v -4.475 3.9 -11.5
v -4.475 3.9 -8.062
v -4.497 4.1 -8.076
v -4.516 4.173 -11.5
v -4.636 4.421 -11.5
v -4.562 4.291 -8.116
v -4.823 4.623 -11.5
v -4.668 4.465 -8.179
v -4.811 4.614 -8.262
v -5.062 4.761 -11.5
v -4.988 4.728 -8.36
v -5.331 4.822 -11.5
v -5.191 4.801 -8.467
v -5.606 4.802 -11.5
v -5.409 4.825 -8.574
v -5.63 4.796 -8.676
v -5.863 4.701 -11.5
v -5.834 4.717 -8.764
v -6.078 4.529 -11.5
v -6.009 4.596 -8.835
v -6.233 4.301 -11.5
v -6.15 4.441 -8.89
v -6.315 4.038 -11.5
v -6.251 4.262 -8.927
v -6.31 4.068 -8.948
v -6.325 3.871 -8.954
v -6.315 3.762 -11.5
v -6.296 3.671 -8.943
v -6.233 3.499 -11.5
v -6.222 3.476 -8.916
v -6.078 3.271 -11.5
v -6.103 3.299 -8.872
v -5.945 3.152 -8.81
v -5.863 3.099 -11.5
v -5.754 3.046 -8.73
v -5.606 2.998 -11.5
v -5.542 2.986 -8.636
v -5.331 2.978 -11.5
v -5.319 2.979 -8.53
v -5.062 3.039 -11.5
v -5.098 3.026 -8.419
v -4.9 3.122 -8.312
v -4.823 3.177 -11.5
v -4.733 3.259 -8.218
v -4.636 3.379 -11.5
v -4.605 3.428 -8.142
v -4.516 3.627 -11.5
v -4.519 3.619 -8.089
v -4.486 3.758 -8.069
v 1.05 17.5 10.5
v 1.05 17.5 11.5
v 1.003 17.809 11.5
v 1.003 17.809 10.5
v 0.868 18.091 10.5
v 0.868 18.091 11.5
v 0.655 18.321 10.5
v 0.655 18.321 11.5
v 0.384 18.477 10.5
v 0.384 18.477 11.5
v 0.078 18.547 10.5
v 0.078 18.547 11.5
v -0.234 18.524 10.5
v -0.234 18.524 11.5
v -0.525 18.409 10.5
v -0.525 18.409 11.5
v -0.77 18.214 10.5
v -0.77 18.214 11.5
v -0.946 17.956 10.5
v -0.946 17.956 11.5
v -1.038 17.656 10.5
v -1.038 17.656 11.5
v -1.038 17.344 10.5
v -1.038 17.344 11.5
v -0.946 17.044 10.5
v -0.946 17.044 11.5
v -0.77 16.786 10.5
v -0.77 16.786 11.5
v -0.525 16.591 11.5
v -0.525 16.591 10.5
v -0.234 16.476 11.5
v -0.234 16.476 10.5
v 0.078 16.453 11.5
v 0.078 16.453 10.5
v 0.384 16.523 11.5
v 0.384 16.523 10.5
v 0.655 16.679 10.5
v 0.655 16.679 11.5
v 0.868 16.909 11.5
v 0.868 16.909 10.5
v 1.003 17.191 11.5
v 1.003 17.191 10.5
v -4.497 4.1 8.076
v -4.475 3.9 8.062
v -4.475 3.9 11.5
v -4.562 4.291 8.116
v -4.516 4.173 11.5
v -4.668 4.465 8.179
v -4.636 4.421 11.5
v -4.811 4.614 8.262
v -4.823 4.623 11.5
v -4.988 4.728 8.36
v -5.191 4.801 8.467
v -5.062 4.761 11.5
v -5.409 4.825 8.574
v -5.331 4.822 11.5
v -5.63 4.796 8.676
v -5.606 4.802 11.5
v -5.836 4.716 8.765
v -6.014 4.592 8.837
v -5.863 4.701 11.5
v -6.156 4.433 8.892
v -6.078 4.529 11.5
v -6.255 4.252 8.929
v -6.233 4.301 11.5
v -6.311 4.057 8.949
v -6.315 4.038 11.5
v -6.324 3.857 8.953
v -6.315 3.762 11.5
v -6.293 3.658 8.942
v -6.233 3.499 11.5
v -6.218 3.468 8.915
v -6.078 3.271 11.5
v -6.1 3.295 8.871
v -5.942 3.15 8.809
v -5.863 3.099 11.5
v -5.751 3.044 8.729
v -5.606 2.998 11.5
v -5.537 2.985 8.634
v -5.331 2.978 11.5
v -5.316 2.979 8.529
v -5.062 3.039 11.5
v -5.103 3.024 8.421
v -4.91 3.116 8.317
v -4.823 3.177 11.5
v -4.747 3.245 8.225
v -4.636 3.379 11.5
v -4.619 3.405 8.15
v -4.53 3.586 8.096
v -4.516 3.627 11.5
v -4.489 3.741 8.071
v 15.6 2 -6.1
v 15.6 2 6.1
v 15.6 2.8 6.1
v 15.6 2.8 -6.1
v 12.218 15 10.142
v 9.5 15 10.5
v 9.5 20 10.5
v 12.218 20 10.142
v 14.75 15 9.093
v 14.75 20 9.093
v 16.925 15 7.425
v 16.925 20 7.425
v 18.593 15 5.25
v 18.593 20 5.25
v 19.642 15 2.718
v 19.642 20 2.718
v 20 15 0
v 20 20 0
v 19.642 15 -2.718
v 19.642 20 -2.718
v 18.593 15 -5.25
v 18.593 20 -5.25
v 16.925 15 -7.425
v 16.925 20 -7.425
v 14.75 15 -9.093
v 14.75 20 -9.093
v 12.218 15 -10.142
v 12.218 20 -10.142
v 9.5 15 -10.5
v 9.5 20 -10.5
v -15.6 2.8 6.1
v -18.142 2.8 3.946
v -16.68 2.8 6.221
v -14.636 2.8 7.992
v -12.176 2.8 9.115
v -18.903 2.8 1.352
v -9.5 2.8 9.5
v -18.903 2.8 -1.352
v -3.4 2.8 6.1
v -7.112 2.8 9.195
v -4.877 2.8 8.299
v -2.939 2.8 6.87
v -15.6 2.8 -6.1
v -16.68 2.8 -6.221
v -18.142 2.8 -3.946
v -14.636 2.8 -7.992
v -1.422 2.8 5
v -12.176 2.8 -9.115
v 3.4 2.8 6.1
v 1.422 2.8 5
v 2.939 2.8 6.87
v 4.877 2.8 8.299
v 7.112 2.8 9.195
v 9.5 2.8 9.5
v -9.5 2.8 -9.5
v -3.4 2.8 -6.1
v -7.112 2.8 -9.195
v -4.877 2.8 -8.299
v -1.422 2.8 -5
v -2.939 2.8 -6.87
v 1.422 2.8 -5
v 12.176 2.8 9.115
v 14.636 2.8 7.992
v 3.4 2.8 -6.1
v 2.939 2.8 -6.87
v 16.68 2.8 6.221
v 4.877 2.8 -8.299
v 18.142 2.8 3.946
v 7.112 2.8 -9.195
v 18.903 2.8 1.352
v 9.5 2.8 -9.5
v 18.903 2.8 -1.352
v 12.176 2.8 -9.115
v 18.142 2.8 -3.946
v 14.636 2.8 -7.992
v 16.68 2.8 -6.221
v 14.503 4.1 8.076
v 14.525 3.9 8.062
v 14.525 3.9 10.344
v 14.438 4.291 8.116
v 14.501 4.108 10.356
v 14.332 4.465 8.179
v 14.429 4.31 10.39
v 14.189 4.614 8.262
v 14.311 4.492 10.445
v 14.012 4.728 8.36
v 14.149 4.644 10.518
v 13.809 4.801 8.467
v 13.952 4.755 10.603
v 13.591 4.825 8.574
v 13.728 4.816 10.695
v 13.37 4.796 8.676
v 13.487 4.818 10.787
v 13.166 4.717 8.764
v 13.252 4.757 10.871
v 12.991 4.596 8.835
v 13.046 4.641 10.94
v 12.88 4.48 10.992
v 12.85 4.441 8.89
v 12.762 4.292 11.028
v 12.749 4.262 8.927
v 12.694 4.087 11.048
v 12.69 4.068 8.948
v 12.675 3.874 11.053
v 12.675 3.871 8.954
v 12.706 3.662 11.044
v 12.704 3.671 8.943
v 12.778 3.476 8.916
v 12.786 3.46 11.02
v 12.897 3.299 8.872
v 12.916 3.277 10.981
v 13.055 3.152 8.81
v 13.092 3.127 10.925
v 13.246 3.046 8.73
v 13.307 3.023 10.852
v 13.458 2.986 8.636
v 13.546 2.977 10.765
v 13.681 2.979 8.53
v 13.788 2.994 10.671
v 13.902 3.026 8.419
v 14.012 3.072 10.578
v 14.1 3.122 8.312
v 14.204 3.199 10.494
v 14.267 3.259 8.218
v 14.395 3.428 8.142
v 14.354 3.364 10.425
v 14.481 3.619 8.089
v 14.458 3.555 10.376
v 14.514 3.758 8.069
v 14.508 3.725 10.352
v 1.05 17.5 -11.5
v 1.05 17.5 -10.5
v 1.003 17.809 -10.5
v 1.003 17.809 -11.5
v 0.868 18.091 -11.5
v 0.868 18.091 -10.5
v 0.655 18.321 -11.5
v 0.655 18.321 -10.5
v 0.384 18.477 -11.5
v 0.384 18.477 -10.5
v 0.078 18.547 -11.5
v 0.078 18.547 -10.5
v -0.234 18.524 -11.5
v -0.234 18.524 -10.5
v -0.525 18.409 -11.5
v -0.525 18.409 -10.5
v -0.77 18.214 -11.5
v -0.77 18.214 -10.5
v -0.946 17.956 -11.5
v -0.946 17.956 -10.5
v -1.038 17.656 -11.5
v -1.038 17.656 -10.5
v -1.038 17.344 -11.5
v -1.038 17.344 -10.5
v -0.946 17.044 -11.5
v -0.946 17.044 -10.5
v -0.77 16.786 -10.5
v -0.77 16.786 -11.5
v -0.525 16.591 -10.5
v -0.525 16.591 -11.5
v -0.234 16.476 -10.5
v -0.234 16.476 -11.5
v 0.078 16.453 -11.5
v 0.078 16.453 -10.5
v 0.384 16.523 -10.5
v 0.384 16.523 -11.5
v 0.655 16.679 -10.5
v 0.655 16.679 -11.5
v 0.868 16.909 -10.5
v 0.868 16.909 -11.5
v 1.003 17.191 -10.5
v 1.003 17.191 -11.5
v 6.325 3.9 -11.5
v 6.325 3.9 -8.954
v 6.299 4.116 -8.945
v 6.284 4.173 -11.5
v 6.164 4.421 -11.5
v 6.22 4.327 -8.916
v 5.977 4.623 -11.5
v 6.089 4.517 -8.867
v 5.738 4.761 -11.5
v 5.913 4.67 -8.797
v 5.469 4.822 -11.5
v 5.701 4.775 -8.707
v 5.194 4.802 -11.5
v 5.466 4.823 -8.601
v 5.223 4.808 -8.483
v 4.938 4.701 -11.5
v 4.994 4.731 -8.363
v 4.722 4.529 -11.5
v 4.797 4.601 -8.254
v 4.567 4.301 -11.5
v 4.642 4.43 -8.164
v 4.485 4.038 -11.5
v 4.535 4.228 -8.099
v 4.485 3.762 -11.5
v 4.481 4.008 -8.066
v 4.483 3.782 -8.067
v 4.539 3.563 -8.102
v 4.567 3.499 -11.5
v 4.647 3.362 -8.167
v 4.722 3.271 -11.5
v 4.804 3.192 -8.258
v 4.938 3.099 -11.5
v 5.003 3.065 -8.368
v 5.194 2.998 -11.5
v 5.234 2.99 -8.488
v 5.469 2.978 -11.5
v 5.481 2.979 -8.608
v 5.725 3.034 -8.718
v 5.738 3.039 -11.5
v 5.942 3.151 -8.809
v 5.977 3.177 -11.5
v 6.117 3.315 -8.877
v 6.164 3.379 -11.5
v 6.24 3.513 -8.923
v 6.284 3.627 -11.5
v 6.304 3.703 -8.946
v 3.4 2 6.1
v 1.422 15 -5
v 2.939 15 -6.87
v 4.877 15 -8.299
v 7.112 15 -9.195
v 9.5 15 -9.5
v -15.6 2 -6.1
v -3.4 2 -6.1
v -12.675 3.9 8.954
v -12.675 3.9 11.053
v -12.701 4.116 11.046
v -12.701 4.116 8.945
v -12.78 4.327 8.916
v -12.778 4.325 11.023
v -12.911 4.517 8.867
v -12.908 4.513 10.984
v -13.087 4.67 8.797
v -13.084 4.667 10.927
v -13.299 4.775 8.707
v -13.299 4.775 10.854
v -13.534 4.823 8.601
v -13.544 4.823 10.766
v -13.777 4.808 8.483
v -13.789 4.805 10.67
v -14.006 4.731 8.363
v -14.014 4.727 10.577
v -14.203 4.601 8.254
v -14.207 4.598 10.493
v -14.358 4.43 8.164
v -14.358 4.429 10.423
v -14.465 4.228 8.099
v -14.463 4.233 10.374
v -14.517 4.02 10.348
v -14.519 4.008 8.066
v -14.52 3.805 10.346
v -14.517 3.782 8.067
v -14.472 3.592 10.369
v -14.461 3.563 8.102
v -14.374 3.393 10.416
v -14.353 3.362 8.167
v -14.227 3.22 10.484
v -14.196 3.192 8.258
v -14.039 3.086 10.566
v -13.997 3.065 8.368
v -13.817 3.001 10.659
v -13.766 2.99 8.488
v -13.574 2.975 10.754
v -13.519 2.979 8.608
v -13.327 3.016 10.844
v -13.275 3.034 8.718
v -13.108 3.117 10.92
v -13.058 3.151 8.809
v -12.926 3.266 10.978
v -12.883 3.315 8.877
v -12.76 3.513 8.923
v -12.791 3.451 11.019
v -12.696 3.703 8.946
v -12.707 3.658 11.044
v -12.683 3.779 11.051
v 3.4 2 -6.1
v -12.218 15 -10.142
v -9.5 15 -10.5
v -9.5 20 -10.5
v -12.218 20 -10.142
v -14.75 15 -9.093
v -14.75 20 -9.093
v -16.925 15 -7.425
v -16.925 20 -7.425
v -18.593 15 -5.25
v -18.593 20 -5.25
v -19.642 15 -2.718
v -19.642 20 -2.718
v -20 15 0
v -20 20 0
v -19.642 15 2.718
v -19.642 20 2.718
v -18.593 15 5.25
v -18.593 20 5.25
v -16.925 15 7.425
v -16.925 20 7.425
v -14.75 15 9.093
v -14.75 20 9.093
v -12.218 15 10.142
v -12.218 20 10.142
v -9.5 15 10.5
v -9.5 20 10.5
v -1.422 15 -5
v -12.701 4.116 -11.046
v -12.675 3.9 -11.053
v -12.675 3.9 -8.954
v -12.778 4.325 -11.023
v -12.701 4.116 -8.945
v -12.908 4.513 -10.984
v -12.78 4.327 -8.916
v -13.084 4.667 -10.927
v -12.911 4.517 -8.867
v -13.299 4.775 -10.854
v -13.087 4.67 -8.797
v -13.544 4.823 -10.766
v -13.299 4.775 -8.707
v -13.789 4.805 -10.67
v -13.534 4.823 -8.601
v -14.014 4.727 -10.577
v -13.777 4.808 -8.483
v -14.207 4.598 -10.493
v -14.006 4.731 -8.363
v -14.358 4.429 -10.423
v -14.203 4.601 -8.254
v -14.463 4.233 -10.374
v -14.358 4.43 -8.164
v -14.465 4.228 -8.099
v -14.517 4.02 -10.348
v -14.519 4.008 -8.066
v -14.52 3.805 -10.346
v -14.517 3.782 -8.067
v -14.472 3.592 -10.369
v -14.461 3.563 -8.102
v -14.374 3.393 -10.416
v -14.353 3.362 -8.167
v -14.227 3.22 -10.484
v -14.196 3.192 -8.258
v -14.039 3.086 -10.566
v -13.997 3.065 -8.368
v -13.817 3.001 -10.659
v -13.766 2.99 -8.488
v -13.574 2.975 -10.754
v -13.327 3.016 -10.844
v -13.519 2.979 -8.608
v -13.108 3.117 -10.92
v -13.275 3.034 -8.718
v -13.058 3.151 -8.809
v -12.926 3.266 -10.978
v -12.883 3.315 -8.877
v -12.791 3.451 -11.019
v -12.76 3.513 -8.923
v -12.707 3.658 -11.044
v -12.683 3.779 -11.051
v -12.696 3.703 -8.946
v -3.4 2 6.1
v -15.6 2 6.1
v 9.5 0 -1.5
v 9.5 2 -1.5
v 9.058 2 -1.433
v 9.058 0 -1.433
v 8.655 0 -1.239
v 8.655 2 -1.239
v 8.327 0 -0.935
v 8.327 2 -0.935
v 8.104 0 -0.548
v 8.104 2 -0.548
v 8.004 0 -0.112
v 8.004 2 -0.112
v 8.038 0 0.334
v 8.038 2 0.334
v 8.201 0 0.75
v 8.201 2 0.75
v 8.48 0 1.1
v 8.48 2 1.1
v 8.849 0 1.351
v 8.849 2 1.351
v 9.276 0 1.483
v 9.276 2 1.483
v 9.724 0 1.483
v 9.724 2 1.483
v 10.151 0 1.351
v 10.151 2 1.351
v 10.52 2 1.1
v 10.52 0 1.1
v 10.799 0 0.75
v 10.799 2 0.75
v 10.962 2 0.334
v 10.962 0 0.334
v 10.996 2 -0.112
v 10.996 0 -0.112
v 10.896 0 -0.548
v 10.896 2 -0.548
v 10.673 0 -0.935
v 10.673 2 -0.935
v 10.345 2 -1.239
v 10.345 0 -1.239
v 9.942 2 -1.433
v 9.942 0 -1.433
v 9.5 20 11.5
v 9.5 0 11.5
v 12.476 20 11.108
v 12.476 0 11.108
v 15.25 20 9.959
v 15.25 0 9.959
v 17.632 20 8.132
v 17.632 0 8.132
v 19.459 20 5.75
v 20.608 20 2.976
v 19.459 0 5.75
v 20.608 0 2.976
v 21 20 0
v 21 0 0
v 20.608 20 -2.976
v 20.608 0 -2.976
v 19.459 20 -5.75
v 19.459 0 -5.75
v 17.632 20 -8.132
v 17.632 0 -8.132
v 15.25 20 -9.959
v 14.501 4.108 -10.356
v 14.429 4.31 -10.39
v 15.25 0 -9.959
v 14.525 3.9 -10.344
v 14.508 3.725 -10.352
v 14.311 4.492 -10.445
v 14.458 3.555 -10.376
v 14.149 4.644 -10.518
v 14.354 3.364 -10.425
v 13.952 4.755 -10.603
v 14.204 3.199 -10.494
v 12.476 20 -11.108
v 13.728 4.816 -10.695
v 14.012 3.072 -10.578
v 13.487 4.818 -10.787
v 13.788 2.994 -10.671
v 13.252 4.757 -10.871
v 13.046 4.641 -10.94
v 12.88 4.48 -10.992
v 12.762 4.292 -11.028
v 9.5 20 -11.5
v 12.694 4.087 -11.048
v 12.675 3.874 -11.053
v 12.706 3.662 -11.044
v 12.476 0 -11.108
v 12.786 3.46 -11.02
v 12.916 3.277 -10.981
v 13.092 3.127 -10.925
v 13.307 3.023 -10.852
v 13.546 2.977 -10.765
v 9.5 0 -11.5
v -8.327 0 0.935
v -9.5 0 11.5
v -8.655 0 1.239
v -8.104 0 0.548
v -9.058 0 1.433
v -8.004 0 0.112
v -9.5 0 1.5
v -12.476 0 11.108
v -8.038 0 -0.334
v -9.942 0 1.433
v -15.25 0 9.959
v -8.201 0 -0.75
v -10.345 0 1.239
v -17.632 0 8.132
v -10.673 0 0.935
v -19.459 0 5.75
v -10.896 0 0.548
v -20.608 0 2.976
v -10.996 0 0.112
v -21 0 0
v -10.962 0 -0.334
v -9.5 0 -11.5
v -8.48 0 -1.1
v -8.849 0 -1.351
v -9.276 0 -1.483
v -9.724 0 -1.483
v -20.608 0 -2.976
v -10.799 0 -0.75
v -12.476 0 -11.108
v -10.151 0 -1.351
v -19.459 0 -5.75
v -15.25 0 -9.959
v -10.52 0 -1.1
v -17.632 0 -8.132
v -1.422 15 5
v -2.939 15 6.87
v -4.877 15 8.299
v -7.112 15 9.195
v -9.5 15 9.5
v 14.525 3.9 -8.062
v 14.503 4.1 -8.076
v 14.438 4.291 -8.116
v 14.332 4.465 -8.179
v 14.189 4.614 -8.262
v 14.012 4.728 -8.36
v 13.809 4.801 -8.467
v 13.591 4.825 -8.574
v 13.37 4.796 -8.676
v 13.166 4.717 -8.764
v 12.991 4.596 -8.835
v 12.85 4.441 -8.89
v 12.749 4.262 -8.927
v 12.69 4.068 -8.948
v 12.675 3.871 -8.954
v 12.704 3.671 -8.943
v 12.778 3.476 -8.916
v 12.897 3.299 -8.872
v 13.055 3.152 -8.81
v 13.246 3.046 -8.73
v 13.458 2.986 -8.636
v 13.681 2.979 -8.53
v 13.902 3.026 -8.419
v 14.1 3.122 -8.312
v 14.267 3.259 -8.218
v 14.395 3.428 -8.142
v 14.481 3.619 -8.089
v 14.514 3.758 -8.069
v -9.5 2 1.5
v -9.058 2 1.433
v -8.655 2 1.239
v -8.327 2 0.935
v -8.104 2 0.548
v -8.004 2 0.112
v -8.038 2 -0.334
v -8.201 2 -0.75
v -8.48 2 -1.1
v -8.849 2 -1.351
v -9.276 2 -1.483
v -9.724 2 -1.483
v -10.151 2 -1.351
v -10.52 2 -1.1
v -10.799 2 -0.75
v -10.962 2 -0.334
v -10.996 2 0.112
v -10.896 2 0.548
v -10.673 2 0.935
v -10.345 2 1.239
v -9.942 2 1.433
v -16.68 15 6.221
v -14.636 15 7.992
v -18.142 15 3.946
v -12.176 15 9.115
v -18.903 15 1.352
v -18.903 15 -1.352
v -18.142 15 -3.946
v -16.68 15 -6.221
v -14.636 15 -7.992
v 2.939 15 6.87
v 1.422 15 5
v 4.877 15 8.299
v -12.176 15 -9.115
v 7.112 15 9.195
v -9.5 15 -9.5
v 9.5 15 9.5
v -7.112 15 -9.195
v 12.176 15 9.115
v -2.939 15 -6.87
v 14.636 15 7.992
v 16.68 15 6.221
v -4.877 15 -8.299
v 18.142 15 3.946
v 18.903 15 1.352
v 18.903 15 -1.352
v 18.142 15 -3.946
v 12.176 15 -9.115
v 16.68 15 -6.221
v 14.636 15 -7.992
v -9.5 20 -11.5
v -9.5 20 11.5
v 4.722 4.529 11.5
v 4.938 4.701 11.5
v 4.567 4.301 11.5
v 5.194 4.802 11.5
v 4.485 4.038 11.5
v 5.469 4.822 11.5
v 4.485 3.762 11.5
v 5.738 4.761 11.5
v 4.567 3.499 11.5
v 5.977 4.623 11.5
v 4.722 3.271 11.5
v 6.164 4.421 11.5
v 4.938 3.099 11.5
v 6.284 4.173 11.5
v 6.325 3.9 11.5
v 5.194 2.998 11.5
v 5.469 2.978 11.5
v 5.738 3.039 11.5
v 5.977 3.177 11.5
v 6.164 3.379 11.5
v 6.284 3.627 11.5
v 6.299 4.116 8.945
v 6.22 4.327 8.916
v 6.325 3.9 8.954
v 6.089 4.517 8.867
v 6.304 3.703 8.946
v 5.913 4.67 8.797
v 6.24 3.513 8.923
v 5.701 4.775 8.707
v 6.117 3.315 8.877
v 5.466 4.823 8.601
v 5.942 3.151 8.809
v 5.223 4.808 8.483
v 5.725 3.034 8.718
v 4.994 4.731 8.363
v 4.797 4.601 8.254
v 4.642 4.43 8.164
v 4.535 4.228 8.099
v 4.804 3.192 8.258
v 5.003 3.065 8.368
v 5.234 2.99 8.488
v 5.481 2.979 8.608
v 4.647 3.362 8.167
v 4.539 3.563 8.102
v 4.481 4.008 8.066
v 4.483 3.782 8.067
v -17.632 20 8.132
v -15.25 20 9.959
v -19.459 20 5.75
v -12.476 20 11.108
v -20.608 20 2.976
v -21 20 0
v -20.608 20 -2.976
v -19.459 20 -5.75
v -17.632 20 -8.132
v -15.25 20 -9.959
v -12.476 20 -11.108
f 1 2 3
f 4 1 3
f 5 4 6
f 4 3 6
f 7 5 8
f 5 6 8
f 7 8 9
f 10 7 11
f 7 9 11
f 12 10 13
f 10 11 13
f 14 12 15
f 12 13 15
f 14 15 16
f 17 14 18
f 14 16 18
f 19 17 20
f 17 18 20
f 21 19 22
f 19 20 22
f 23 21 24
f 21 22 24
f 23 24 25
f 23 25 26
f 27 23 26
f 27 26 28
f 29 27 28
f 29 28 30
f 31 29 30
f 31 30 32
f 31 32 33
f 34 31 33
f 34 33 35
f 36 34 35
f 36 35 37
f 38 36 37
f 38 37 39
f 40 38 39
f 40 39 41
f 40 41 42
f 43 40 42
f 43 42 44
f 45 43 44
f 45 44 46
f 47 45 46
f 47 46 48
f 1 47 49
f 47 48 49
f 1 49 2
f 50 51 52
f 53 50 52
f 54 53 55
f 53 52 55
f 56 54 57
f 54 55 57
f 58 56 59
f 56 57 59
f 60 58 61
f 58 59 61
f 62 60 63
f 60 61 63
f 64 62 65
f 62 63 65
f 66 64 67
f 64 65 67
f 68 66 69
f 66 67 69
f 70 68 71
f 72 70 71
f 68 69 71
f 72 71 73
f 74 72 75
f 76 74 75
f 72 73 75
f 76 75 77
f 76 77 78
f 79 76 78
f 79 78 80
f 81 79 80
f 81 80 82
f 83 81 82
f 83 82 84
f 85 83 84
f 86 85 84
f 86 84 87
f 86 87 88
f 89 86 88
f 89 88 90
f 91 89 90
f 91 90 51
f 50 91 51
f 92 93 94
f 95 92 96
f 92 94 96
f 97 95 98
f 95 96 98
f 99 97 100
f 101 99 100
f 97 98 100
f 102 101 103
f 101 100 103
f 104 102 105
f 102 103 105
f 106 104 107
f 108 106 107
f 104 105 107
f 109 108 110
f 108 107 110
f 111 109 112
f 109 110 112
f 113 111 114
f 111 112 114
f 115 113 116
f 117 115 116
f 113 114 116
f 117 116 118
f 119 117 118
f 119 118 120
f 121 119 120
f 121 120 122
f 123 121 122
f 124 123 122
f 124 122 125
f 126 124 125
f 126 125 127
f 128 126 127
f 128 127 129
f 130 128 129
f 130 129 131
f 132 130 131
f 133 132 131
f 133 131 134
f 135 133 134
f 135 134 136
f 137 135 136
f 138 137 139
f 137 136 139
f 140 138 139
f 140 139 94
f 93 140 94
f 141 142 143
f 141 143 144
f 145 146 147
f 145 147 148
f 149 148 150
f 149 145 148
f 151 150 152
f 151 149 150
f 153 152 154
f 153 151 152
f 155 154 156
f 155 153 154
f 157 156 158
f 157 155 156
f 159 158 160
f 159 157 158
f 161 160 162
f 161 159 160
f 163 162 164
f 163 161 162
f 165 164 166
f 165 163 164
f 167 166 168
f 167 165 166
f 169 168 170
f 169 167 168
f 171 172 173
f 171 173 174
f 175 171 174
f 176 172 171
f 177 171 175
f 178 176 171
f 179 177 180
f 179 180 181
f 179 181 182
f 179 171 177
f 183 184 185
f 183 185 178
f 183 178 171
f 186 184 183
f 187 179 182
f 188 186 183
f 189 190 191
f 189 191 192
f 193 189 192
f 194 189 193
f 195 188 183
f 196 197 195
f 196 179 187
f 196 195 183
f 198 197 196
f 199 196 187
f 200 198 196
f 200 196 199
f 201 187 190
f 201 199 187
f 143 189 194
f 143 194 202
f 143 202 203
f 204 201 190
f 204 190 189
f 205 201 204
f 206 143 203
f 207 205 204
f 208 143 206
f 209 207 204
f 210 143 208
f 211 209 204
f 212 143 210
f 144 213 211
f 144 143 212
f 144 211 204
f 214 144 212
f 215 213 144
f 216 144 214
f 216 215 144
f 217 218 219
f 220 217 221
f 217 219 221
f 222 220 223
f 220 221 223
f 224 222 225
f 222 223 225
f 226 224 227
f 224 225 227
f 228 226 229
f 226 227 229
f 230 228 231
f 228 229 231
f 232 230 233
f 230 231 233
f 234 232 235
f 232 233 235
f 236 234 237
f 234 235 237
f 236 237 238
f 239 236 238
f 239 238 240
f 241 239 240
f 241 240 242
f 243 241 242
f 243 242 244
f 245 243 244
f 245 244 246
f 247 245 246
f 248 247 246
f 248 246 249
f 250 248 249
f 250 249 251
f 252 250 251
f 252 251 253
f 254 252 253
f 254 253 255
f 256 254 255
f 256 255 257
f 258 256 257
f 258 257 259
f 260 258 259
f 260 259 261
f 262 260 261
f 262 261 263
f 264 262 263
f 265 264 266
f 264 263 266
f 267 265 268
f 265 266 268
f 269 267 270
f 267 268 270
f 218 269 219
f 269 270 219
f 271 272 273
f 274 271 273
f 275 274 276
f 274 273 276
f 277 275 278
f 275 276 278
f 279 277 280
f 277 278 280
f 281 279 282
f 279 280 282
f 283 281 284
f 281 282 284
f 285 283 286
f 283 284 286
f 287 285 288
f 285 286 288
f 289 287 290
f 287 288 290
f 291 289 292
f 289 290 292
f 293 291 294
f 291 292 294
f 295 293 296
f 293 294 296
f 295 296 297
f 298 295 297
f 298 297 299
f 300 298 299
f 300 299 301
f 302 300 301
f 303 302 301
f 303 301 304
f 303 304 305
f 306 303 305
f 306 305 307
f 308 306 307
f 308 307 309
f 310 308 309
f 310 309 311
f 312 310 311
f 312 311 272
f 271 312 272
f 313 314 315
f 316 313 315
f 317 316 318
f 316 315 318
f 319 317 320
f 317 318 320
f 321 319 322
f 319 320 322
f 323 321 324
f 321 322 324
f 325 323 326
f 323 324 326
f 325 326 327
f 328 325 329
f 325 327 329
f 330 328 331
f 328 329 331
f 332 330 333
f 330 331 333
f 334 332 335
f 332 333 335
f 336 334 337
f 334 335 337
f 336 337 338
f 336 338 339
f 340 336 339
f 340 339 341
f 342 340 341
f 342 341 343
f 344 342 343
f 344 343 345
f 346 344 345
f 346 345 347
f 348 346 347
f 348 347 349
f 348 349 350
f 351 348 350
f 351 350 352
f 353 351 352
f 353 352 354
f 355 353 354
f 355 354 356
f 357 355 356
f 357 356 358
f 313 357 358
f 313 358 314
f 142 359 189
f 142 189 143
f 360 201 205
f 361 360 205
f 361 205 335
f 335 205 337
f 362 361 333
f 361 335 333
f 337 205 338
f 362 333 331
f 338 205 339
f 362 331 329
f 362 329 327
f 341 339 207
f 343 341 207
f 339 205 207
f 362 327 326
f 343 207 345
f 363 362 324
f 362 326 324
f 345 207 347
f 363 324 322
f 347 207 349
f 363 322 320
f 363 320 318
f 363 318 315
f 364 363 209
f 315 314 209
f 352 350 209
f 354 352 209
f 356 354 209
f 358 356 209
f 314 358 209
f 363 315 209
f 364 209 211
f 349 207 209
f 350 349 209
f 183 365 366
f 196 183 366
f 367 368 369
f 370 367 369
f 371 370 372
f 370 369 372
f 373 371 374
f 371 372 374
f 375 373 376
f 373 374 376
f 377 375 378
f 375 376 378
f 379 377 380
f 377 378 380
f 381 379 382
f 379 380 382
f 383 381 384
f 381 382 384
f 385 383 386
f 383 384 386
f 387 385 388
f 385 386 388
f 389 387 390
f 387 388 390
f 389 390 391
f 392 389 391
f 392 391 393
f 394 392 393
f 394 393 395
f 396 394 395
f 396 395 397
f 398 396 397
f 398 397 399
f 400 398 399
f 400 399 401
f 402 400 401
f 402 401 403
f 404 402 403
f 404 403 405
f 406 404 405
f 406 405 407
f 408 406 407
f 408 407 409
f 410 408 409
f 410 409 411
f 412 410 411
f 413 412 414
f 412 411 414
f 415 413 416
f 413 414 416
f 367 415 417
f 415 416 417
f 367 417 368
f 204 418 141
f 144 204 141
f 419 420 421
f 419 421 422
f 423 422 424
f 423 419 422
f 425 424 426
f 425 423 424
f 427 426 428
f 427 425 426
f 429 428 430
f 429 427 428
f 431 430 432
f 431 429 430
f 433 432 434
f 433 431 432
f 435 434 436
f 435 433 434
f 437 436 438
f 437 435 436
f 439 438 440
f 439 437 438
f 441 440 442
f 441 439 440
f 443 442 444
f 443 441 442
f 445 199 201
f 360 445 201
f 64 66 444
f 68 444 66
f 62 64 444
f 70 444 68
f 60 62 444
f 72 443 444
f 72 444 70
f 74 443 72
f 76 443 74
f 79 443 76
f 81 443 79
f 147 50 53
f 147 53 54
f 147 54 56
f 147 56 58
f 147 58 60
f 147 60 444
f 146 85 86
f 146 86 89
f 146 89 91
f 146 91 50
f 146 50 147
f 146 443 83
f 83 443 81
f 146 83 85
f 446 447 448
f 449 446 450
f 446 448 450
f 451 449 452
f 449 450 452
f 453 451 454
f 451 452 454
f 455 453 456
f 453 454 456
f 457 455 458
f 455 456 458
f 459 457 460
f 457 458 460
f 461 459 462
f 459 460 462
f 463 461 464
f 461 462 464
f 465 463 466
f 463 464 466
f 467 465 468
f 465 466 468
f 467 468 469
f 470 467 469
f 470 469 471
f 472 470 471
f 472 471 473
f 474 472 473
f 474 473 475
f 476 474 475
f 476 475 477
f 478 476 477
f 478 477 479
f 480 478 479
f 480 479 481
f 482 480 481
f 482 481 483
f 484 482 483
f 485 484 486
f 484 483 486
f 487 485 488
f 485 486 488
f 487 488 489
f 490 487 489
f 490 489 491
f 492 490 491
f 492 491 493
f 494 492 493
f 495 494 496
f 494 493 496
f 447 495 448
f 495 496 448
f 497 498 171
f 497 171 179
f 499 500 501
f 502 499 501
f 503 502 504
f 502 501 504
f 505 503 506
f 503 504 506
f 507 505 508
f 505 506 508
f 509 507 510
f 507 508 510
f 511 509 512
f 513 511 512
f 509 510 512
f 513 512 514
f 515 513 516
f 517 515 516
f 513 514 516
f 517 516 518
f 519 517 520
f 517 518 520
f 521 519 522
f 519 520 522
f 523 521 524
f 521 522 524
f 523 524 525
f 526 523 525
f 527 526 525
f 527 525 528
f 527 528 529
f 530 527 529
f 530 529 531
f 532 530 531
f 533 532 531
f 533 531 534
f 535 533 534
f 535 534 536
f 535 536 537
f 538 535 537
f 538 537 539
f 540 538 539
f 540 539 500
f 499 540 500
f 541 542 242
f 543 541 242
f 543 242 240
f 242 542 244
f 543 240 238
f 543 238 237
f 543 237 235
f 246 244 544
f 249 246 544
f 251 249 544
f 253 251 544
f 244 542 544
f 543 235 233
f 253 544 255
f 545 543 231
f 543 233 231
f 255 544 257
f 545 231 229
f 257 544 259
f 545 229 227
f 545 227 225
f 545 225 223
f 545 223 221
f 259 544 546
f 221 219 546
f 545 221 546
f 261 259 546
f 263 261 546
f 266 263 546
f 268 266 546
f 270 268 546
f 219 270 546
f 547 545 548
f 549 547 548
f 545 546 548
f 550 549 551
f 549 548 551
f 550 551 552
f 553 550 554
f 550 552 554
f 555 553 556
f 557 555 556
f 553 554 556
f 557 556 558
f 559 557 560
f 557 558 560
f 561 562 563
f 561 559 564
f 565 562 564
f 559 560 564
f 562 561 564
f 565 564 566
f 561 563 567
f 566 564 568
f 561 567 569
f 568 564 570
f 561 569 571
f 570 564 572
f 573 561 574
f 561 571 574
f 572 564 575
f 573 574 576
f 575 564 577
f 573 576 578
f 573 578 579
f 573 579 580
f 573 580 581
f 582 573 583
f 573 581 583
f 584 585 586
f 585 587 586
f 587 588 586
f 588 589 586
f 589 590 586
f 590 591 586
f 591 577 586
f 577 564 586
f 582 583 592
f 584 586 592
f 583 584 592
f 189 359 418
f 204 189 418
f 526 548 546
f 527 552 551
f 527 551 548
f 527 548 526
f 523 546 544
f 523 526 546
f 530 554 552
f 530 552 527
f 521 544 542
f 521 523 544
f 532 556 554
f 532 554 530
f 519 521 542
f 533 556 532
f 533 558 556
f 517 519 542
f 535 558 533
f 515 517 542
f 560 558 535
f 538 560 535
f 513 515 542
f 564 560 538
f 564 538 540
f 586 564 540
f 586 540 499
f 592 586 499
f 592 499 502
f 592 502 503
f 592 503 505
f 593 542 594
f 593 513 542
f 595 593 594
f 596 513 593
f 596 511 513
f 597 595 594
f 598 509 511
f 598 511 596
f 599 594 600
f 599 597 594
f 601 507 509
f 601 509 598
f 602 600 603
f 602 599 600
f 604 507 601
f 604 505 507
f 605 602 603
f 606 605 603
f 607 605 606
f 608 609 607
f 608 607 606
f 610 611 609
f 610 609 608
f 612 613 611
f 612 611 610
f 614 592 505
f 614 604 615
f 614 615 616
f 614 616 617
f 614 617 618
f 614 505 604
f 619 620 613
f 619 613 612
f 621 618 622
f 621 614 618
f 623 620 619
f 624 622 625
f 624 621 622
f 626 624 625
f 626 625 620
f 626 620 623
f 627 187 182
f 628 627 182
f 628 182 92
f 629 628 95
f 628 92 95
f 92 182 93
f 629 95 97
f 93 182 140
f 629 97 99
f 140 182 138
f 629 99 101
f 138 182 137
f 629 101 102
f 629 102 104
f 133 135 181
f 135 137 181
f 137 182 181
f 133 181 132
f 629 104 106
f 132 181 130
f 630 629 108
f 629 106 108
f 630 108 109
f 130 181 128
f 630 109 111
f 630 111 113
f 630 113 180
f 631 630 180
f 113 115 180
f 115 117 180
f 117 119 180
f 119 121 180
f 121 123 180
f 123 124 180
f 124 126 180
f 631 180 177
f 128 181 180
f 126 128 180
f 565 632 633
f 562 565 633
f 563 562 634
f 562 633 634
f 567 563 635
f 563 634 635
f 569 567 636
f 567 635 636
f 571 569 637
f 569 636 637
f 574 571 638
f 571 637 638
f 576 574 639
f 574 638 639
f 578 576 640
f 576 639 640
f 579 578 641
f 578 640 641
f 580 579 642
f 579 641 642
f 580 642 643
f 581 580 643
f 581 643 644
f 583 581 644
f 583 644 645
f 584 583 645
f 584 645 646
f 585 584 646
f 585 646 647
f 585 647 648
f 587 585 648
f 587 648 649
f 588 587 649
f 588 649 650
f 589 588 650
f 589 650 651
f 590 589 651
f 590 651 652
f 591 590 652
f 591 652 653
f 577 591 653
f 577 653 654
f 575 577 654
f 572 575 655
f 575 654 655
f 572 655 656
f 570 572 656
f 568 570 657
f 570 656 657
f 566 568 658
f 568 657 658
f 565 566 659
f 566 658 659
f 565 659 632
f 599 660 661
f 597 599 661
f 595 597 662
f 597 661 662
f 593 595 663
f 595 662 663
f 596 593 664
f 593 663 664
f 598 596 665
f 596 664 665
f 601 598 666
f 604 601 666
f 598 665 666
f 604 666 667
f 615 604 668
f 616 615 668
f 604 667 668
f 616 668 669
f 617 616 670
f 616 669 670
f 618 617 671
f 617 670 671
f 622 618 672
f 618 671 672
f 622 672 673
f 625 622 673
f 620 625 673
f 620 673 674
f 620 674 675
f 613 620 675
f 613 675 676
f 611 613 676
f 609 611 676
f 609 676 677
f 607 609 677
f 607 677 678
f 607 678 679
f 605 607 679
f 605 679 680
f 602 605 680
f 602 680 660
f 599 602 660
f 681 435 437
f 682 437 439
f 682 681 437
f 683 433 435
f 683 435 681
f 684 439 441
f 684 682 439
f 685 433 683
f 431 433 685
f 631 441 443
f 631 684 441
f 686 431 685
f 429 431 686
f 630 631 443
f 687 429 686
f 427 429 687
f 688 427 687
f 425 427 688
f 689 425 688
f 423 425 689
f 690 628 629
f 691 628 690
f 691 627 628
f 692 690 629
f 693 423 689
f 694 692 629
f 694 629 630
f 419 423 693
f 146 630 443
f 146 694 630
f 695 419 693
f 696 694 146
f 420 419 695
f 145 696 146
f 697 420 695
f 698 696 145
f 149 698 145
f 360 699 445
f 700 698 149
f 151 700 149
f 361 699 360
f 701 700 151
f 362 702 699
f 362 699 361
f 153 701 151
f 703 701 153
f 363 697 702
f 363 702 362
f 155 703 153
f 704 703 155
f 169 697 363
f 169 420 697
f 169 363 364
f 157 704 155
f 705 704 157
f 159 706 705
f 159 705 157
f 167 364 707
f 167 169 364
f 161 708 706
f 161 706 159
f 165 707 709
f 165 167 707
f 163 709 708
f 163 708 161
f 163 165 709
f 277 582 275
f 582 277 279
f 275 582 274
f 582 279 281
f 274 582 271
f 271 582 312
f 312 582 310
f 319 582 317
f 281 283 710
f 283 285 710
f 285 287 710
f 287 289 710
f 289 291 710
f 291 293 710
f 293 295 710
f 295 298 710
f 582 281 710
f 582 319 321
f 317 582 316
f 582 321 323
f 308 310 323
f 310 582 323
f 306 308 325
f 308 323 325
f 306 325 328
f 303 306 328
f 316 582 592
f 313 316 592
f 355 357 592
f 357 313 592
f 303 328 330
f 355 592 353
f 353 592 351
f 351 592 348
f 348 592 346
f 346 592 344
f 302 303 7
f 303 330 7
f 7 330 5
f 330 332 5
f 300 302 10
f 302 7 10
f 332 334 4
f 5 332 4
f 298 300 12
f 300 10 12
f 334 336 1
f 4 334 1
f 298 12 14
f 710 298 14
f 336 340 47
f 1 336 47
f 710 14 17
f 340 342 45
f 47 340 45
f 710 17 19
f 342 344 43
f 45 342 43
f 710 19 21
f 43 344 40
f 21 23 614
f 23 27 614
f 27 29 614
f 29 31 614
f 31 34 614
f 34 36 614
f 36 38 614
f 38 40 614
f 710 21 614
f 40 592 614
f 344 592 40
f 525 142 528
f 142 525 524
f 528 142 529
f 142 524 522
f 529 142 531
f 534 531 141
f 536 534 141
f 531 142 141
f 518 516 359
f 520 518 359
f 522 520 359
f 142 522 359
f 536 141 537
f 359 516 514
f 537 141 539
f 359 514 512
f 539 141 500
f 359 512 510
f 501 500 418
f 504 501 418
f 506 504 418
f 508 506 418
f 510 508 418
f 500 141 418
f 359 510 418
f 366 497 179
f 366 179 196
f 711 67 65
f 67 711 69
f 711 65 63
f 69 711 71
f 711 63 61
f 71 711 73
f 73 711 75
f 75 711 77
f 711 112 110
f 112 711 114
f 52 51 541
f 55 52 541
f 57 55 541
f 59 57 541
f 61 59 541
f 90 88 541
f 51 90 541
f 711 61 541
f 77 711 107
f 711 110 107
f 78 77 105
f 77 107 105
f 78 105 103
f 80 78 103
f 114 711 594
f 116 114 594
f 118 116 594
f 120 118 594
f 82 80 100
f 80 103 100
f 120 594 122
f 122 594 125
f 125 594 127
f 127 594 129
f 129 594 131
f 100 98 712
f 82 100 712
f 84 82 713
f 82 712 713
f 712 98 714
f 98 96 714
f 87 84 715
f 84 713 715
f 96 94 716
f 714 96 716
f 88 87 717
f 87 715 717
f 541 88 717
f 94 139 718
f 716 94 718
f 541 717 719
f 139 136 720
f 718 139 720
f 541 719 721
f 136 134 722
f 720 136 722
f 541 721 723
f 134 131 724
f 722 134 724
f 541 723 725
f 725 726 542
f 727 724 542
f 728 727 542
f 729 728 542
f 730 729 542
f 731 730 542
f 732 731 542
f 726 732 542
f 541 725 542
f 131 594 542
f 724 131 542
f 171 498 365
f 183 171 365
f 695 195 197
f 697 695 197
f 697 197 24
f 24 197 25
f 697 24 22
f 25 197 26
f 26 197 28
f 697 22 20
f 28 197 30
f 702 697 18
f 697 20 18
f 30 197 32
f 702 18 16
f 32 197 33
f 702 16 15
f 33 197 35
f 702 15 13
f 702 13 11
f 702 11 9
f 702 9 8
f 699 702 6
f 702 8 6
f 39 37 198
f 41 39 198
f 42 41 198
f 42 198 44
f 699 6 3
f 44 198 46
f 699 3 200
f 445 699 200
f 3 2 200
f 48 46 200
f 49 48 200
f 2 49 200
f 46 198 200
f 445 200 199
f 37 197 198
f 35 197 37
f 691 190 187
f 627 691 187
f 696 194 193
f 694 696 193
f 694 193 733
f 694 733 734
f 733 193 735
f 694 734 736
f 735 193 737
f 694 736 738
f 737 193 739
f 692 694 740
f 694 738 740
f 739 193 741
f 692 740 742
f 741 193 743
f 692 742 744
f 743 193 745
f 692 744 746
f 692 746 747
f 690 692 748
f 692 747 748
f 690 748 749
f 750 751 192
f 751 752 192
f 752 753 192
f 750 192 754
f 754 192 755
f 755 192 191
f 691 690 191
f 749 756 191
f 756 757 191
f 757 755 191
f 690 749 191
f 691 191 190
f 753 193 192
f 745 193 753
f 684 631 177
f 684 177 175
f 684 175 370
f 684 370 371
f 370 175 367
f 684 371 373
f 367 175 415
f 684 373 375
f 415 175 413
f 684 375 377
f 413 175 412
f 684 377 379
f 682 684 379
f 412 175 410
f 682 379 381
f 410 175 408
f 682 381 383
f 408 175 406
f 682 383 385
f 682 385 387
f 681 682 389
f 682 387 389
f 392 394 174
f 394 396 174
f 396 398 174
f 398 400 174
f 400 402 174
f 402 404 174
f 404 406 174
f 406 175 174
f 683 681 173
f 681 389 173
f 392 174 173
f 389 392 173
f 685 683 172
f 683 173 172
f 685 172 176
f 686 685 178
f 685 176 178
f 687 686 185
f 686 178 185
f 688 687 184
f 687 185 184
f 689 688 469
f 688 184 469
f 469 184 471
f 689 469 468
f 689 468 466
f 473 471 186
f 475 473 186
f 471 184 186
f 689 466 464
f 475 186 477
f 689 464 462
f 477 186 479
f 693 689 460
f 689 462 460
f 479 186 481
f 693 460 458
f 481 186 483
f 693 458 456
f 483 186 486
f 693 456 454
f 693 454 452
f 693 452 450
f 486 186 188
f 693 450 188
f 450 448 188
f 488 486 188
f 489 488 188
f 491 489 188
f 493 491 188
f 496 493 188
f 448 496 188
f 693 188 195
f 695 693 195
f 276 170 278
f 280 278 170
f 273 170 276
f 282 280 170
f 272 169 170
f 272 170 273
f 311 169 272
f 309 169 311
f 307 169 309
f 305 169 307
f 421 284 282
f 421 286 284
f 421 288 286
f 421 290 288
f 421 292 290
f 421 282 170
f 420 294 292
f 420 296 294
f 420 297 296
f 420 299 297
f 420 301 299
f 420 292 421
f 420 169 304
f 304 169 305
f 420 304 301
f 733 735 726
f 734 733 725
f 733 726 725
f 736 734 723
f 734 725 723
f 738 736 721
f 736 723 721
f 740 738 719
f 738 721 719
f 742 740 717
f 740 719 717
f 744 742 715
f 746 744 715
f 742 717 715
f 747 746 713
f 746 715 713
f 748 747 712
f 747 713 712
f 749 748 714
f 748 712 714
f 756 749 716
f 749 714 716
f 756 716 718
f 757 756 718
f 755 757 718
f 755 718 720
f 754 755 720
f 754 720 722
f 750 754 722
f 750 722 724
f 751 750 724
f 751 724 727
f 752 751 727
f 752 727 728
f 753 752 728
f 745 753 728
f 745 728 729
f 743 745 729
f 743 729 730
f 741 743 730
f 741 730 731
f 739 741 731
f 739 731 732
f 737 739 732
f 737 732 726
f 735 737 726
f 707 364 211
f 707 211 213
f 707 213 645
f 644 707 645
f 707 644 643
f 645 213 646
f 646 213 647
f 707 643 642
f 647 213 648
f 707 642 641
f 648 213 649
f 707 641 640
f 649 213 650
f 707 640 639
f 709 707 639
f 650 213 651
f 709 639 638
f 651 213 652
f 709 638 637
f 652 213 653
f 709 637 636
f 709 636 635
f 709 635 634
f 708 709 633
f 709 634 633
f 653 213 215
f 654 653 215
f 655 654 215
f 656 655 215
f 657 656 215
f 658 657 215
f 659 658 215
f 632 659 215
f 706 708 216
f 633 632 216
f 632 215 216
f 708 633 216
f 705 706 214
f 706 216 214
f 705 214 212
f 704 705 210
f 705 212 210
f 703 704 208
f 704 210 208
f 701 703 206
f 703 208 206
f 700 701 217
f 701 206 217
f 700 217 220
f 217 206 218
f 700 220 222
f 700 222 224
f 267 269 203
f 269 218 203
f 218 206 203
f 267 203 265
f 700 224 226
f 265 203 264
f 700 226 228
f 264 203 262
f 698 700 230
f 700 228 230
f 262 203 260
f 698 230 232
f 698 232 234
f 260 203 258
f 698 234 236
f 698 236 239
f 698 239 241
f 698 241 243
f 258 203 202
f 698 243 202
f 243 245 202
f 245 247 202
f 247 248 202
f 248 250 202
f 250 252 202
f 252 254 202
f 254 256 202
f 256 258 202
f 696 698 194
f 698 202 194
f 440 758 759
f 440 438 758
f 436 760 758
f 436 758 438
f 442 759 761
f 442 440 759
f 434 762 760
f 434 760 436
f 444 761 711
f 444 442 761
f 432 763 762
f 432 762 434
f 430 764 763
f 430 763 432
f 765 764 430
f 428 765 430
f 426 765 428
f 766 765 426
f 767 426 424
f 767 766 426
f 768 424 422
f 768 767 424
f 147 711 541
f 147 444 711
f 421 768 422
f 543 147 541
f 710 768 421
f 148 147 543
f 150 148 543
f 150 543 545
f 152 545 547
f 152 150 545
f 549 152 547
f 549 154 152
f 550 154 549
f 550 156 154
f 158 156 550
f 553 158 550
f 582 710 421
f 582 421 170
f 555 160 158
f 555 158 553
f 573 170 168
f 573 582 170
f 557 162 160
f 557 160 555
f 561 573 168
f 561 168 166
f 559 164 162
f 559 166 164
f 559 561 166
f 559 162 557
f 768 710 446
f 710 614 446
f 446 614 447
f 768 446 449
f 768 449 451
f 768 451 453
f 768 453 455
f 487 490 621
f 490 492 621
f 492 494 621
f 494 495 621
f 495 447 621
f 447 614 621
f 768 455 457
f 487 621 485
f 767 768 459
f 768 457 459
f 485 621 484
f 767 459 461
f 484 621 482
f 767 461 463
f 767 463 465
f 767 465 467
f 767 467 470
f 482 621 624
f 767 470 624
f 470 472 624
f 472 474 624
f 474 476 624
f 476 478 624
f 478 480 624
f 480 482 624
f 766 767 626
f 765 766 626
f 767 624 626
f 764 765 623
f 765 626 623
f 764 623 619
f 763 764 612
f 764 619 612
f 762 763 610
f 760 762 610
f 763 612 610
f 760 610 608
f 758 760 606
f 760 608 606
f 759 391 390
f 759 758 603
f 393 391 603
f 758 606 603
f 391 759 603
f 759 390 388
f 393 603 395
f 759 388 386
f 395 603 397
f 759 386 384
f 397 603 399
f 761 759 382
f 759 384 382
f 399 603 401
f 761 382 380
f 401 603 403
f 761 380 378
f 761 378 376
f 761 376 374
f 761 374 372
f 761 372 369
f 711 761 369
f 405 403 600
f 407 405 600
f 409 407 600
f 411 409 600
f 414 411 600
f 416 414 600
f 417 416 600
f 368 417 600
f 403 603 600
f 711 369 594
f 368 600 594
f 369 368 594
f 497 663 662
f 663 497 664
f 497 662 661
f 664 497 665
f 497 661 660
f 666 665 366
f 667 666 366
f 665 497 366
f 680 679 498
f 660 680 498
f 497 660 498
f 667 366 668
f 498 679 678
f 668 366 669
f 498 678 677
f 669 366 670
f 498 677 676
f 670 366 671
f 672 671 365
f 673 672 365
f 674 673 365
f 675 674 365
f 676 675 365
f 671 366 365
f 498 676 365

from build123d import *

# Parameters (mm, degrees)
BOSS_EXTRUDE1_DEPTH = 2
BOSS_EXTRUDE2_DEPTH = 13
BOSS_EXTRUDE3_DEPTH = 5
SKETCH8_R           = 1.5
CUT_EXTRUDE3_DEPTH  = 30.954131602
SKETCH10_W          = 12.2
SKETCH10_H          = 12.2
BOSS_EXTRUDE4_DEPTH = 0.8
SKETCH11_R          = 0.925
CUT_EXTRUDE4_DEPTH  = 38.013511047
SKETCH12_R          = 1.05
CUT_EXTRUDE5_DEPTH  = 38.01351122


with BuildPart() as part:
    # Sketch1 → Boss-Extrude1 (new body)
    with BuildSketch(Plane(origin=(0, 0, 0), x_dir=(1, 0, 0), z_dir=(0, 1, 0))):
        with BuildLine():
            Line((-9.5, 11.5), (9.5, 11.5))
            ThreePointArc((9.5, 11.5), (21, 0), (9.5, -11.5))
            Line((9.5, -11.5), (-9.5, -11.5))
            ThreePointArc((-9.5, -11.5), (-21, 0), (-9.5, 11.5))
        make_face()
    extrude(amount=BOSS_EXTRUDE1_DEPTH)

    # Sketch2 → Boss-Extrude2 (add)
    with BuildSketch(Plane(origin=(0, 2, 0), x_dir=(1, 0, 0), z_dir=(0, 1, 0))):
        with BuildLine():
            ThreePointArc((-9.5, 11.5), (-21, 0), (-9.5, -11.5))
            Line((-9.5, -11.5), (9.5, -11.5))
            ThreePointArc((9.5, -11.5), (21, 0), (9.5, 11.5))
            Line((9.5, 11.5), (-9.5, 11.5))
        make_face()
        with BuildLine():
            ThreePointArc((-9.5, 9.5), (-4.876689498, 8.299096336), (-1.422252789, 5))
            Line((-1.422252789, 5), (1.422252789, 5))
            ThreePointArc((1.422252789, 5), (4.876689498, 8.299096336), (9.5, 9.5))
            ThreePointArc((9.5, 9.5), (19, 0), (9.5, -9.5))
            ThreePointArc((9.5, -9.5), (4.876689498, -8.299096336), (1.422252789, -5))
            Line((1.422252789, -5), (-1.422252789, -5))
            ThreePointArc((-1.422252789, -5), (-4.876689498, -8.299096336), (-9.5, -9.5))
            ThreePointArc((-9.5, -9.5), (-19, 0), (-9.5, 9.5))
        make_face(mode=Mode.SUBTRACT)
    extrude(amount=BOSS_EXTRUDE2_DEPTH)

    # Sketch4 → Boss-Extrude3 (add)
    with BuildSketch(Plane(origin=(0, 15, 0), x_dir=(1, 0, 0), z_dir=(0, 1, 0))):
        with BuildLine():
            Line((9.5, 11.5), (-9.5, 11.5))
            ThreePointArc((-9.5, 11.5), (-21, 0), (-9.5, -11.5))
            Line((-9.5, -11.5), (9.5, -11.5))
            ThreePointArc((9.5, -11.5), (21, 0), (9.5, 11.5))
        make_face()
        with BuildLine():
            Line((9.5, 10.5), (-9.5, 10.5))
            ThreePointArc((-9.5, 10.5), (-20, 0), (-9.5, -10.5))
            Line((-9.5, -10.5), (9.5, -10.5))
            ThreePointArc((9.5, -10.5), (20, 0), (9.5, 10.5))
        make_face(mode=Mode.SUBTRACT)
    extrude(amount=BOSS_EXTRUDE3_DEPTH)

    # Sketch8 → Cut-Extrude3 (cut, through all)
    with BuildSketch(Plane(origin=(0, 2, 0), x_dir=(1, 0, 0), z_dir=(0, 1, 0))):
        with Locations(Location((-9.5, 0, 0), (0, 0, 270))):
            Circle(SKETCH8_R)
        with Locations(Location((9.5, 0, 0), (0, 0, 90))):
            Circle(SKETCH8_R)
    extrude(amount=-CUT_EXTRUDE3_DEPTH, mode=Mode.SUBTRACT)

    # Sketch10 → Boss-Extrude4 (add)
    with BuildSketch(Plane(origin=(0, 2, 0), x_dir=(1, 0, 0), z_dir=(0, 1, 0))):
        with BuildLine():
            Line((-1.422252789, -5), (1.422252789, -5))
            ThreePointArc((1.422252789, -5), (19, 0), (1.422252789, 5))
            Line((1.422252789, 5), (-1.422252789, 5))
            ThreePointArc((-1.422252789, 5), (-19, 0), (-1.422252789, -5))
        make_face()
        with Locations((9.5, 0)):
            Rectangle(SKETCH10_W, SKETCH10_H, mode=Mode.SUBTRACT)
        with Locations((-9.5, 0)):
            Rectangle(SKETCH10_W, SKETCH10_H, mode=Mode.SUBTRACT)
    extrude(amount=BOSS_EXTRUDE4_DEPTH)

    # Sketch11 → Cut-Extrude4 (cut, through all)
    with BuildSketch(Plane.XY.offset(11.5)):
        with Locations((-5.4, 3.9)):
            Circle(SKETCH11_R)
        with Locations((-13.6, 3.9)):
            Circle(SKETCH11_R)
        with Locations((13.6, 3.9)):
            Circle(SKETCH11_R)
        with Locations((5.4, 3.9)):
            Circle(SKETCH11_R)
    extrude(amount=-CUT_EXTRUDE4_DEPTH, mode=Mode.SUBTRACT)

    # Sketch12 → Cut-Extrude5 (cut, through all)
    with BuildSketch(Plane.XY.offset(11.5)):
        with Locations((0, 17.5)):
            Circle(SKETCH12_R)
    extrude(amount=-CUT_EXTRUDE5_DEPTH, mode=Mode.SUBTRACT)


solid = part.part
